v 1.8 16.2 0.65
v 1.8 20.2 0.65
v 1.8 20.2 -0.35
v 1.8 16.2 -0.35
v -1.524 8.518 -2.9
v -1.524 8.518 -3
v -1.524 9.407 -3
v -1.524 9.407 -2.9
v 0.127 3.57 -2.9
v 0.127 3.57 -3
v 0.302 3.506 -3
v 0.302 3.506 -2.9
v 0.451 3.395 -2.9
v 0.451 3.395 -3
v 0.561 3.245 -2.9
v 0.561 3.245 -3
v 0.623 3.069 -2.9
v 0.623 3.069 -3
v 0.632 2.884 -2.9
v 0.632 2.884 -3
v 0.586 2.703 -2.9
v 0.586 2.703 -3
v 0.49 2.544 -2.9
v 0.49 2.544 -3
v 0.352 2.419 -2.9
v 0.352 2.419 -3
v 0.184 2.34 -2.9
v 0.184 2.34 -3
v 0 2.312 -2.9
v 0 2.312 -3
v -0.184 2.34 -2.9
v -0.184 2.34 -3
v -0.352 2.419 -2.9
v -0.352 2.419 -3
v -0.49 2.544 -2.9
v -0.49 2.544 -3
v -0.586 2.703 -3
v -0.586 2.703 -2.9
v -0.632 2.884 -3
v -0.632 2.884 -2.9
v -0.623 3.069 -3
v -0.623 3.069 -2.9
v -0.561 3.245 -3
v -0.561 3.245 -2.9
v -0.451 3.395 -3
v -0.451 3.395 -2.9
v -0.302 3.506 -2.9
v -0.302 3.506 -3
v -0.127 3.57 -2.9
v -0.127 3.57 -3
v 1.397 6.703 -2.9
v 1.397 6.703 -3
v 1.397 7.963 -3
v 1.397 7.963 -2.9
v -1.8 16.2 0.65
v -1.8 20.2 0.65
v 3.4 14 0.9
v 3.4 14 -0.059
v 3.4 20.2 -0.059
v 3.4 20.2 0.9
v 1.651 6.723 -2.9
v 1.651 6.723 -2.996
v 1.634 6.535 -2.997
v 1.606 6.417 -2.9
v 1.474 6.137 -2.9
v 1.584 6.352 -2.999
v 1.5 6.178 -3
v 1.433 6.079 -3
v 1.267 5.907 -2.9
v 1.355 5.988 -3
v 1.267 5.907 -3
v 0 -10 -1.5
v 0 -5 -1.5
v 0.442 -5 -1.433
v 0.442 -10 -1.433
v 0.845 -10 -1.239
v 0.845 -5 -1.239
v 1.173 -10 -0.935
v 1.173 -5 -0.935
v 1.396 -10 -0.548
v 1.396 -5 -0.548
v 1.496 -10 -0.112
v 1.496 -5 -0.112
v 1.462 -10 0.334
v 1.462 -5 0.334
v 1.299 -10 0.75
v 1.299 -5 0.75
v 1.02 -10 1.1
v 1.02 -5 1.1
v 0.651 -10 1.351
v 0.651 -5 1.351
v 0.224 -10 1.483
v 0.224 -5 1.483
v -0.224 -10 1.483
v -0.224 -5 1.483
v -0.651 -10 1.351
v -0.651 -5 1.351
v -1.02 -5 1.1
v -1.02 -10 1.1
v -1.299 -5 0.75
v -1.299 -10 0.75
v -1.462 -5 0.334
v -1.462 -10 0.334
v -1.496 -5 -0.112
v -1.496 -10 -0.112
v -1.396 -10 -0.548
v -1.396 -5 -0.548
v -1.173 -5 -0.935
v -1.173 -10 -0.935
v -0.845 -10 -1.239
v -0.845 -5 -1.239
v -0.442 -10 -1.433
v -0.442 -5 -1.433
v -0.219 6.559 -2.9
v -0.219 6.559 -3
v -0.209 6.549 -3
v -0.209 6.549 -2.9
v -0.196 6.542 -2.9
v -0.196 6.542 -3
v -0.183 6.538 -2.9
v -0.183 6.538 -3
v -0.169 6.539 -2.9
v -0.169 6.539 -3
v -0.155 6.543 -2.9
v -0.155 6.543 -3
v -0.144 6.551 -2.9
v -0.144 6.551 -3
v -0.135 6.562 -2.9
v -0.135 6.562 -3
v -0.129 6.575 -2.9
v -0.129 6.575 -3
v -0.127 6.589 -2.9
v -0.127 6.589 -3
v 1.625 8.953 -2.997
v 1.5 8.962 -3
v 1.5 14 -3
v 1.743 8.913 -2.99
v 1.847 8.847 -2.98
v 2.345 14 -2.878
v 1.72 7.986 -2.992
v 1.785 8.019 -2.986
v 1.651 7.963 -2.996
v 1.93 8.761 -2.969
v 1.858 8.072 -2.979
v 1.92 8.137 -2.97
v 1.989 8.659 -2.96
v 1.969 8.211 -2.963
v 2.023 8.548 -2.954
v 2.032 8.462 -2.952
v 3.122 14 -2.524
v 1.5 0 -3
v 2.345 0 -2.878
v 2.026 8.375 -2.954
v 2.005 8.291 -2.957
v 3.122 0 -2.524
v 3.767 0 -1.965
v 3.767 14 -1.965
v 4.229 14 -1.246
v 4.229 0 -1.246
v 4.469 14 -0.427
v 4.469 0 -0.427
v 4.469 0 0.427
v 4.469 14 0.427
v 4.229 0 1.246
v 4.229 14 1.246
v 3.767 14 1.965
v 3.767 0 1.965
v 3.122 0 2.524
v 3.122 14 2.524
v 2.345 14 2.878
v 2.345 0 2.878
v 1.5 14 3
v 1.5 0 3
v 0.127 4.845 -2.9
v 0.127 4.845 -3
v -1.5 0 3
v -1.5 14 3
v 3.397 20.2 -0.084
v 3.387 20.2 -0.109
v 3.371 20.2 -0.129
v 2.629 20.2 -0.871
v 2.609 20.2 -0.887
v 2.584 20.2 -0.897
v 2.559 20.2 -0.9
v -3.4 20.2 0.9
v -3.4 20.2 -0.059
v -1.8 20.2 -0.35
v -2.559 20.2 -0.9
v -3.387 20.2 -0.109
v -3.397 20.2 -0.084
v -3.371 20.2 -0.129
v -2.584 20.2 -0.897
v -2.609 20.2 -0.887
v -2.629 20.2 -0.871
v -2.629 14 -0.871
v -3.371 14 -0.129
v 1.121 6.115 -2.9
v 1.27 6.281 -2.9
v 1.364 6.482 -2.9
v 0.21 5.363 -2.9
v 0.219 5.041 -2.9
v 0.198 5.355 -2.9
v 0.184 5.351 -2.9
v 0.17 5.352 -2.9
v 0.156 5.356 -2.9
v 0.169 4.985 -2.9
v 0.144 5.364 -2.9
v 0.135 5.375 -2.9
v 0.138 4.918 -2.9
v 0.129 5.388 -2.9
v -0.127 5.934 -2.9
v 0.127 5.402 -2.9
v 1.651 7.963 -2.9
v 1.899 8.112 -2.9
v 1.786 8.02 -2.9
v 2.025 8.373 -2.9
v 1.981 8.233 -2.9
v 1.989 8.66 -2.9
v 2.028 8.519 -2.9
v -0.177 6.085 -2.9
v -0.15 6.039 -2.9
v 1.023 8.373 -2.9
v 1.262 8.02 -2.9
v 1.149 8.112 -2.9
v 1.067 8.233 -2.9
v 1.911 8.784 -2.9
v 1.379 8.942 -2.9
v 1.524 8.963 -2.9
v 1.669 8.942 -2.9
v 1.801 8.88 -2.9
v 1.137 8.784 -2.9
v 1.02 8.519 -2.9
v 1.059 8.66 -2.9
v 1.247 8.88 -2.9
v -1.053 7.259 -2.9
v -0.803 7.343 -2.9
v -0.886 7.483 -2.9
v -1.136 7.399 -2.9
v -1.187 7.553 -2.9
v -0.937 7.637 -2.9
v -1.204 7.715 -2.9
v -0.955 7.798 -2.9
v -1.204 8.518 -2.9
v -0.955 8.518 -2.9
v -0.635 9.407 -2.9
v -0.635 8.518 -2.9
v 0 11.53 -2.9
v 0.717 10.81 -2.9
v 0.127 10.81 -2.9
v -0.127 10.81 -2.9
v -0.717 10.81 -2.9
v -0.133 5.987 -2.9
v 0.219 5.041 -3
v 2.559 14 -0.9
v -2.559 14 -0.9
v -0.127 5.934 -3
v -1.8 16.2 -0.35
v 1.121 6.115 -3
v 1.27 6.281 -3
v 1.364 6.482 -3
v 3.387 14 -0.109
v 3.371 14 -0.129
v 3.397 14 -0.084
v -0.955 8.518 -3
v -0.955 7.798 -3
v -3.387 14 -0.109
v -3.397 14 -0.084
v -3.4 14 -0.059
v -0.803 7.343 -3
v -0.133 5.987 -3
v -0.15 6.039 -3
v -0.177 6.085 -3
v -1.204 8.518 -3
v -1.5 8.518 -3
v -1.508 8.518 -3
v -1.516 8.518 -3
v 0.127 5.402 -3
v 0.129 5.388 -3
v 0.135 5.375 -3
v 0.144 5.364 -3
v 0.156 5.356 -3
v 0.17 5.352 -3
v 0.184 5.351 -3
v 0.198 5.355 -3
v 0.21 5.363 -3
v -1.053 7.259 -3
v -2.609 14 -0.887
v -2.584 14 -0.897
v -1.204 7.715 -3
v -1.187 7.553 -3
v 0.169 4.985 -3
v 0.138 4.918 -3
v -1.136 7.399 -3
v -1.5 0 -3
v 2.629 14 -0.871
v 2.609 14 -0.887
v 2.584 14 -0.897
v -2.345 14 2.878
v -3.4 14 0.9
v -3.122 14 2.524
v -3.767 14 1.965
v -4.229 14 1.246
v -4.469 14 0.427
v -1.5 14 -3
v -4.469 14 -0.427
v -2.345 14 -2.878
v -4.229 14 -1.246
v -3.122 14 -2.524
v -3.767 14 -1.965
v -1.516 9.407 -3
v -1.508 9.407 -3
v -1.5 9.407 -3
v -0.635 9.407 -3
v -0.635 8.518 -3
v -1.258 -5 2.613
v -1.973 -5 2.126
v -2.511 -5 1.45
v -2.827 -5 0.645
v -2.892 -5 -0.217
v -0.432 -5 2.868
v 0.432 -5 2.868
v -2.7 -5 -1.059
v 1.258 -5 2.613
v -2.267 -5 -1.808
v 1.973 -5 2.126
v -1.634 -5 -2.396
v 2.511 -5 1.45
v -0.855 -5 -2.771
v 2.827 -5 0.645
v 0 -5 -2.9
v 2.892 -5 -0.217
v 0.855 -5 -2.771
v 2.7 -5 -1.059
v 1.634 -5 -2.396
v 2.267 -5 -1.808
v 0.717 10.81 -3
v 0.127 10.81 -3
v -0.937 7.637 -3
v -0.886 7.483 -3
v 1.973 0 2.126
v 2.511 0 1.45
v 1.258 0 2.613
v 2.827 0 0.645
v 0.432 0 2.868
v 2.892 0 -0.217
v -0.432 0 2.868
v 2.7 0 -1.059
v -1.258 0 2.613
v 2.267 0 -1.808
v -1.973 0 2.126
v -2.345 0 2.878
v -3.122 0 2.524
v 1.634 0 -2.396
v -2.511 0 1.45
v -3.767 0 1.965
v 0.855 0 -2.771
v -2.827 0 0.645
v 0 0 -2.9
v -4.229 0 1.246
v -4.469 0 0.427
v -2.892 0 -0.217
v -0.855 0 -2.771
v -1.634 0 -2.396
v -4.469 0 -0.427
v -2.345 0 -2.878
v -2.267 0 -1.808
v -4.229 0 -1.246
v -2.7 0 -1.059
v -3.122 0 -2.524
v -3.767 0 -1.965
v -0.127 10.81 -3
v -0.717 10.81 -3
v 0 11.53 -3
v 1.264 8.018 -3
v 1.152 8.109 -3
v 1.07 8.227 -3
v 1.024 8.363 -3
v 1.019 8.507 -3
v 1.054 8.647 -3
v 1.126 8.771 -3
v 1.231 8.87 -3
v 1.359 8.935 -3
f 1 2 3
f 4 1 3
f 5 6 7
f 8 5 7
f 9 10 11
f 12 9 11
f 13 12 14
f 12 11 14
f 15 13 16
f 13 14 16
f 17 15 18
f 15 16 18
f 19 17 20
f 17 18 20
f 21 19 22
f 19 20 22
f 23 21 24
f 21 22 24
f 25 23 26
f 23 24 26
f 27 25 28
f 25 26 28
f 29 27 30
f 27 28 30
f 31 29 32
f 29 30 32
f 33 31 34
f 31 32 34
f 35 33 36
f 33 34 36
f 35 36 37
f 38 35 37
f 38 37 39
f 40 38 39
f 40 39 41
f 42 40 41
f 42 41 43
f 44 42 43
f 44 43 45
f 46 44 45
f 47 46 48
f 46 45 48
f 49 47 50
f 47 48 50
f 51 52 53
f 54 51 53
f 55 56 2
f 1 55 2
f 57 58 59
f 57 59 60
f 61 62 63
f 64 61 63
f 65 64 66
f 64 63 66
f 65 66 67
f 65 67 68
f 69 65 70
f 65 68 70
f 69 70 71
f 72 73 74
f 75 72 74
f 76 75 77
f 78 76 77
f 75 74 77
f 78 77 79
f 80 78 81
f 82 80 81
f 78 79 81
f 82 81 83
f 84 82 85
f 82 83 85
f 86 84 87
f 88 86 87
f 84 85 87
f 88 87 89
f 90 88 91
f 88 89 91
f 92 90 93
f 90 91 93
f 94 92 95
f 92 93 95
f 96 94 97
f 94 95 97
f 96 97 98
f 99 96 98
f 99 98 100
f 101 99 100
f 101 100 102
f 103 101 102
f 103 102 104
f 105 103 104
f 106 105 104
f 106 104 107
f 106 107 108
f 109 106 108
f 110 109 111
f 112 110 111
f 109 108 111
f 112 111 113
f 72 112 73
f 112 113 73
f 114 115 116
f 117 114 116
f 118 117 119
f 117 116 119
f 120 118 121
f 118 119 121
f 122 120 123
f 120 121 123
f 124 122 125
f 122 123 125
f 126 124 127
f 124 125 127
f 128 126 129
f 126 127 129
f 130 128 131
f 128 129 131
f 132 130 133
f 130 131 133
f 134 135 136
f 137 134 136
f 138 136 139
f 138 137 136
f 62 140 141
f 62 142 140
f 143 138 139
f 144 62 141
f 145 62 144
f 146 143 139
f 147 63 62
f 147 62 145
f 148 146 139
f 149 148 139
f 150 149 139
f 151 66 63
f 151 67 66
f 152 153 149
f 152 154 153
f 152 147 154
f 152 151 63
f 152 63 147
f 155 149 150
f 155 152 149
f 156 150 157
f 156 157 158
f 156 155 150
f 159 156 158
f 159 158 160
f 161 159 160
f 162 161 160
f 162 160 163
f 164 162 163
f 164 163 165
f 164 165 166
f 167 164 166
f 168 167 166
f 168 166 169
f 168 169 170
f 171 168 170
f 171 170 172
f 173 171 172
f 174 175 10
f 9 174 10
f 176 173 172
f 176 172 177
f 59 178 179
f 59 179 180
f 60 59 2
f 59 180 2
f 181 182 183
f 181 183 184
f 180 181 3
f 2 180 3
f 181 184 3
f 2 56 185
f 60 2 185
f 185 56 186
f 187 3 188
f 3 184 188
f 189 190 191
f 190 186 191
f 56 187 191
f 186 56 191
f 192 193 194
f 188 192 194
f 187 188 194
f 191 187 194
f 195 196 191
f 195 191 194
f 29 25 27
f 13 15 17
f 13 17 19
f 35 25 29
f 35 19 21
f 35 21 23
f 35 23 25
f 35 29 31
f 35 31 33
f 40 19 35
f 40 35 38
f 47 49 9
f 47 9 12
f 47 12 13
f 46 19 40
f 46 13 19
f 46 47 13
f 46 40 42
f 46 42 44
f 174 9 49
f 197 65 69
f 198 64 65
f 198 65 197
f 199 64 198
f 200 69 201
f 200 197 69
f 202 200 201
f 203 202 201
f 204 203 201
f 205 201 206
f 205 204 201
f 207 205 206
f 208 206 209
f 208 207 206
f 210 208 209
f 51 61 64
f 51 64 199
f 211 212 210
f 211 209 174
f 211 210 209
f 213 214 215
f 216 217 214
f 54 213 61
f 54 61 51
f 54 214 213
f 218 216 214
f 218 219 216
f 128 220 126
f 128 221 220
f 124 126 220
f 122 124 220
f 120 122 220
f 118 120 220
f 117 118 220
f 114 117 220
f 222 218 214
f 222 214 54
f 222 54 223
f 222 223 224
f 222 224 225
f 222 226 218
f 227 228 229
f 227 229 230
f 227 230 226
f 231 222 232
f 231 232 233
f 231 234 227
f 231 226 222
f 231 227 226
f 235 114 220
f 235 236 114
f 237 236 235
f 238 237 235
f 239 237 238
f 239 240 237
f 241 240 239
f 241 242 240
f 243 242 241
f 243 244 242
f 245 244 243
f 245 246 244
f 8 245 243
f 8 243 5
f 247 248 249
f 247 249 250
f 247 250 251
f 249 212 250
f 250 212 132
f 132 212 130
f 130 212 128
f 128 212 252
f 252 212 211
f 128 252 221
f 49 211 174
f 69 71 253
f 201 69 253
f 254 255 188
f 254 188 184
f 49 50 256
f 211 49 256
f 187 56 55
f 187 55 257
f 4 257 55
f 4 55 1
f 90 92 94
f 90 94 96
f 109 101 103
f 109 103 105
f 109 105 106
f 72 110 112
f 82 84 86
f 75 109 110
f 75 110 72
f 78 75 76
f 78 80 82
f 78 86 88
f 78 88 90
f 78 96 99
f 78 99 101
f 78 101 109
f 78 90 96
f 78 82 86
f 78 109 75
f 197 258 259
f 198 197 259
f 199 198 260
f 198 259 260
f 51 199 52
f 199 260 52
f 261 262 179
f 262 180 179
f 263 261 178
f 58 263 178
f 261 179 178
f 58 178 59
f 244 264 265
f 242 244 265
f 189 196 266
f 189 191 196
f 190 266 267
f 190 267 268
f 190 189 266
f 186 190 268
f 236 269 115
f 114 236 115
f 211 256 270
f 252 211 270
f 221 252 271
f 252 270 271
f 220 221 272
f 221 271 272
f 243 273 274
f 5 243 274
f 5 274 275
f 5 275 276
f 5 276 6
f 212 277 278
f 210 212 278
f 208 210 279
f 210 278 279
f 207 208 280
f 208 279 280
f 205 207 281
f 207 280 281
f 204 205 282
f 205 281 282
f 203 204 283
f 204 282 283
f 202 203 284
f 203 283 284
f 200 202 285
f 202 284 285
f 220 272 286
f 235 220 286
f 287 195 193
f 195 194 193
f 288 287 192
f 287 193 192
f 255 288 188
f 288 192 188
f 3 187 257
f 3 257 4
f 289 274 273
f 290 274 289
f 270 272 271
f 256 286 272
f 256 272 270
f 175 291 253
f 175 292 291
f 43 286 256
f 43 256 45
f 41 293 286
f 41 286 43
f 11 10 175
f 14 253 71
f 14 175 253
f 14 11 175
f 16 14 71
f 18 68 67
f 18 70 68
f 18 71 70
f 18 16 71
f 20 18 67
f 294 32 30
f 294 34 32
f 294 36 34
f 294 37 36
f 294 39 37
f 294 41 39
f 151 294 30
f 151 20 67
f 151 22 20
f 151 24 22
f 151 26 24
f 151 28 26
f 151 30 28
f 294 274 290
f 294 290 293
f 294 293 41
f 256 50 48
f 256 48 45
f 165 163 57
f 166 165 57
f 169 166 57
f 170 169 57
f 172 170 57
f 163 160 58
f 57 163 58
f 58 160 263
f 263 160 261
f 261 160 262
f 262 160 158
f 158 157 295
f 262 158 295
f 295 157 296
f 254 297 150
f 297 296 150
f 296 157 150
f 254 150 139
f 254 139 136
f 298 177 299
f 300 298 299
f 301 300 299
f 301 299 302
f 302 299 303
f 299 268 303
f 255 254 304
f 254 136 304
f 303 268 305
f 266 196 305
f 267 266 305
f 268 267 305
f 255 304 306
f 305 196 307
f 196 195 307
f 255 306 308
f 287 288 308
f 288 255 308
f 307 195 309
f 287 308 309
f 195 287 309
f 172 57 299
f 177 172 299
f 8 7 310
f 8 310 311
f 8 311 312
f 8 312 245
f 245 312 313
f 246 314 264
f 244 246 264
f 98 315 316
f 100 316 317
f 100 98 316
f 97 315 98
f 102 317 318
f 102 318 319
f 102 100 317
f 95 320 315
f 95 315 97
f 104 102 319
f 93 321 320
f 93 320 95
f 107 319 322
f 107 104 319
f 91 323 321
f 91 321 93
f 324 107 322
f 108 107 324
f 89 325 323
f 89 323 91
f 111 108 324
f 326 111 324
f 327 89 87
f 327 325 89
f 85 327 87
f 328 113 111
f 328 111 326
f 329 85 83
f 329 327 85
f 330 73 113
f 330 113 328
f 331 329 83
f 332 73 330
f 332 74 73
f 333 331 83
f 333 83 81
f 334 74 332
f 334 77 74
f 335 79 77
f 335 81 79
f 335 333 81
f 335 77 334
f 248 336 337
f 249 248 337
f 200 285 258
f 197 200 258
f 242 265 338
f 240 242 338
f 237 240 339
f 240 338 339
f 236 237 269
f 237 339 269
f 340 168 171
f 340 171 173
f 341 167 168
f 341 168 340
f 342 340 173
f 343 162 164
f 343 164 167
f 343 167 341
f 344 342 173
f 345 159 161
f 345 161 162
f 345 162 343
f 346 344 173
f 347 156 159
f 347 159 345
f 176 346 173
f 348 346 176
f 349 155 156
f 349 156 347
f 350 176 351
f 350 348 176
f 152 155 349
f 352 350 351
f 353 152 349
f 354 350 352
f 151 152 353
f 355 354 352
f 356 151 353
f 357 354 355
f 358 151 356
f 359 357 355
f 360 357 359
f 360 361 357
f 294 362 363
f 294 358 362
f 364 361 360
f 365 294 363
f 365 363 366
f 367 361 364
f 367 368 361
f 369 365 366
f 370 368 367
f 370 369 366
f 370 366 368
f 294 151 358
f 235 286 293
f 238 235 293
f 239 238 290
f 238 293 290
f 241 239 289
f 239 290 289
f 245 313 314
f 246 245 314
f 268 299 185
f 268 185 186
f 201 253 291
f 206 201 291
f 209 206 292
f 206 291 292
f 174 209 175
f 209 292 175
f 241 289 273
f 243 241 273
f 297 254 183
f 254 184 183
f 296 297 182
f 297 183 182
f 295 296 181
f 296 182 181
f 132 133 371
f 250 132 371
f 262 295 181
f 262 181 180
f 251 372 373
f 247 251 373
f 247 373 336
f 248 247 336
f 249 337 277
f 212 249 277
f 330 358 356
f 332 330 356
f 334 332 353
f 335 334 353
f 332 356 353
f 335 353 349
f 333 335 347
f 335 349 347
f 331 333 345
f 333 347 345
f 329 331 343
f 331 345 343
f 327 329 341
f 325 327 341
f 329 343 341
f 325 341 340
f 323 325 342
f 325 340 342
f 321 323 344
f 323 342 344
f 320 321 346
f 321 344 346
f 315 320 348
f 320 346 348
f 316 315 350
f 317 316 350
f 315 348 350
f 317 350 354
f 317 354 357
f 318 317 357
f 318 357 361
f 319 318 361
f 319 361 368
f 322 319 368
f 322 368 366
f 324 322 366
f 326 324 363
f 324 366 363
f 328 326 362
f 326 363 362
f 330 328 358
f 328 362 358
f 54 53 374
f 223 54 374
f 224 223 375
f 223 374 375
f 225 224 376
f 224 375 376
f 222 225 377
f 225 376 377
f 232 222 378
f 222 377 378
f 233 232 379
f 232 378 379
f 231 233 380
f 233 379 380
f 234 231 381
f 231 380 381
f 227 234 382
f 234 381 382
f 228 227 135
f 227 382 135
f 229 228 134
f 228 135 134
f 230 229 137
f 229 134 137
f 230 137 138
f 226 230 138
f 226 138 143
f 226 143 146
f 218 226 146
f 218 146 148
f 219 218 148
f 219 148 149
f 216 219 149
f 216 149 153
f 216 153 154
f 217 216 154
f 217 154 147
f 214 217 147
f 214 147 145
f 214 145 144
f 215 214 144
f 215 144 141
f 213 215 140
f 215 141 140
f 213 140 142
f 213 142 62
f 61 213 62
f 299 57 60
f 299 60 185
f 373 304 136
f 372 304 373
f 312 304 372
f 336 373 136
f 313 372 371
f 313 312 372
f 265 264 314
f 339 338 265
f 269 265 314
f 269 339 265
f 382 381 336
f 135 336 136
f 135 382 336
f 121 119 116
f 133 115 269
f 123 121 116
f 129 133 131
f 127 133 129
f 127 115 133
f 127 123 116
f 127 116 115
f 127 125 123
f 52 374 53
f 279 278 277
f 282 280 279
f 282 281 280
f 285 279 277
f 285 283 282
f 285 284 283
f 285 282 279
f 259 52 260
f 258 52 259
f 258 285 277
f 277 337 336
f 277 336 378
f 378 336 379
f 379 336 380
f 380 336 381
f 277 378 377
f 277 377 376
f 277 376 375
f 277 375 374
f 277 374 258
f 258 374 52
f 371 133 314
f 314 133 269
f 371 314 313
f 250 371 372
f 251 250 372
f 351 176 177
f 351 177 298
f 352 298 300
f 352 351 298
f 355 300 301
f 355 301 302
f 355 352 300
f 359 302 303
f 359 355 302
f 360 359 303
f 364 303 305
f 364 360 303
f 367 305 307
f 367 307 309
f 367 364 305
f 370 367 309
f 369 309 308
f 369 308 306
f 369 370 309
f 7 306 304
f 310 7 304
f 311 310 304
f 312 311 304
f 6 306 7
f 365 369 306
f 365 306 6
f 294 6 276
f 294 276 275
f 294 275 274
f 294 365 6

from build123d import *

# Parameters (mm, degrees)
EXTRUDE_1_DEPTH     = 14
SKETCH_2_R          = 2.9
EXTRUDE_2_DEPTH     = 5
EXTRUDE_3_DEPTH     = 6.2
SKETCH_5_W          = 3.6
SKETCH_5_H          = 1
CUT_EXTRUDE_1_DEPTH = 4
FILLET_1_R          = 0.1
SKETCH_6_R          = 1.5
EXTRUDE_4_DEPTH     = 5
CUT_EXTRUDE_2_DEPTH = 0.1


with BuildPart() as part:
    # 草图1 → 凸台-拉伸1 (new body)
    with BuildSketch(Plane(origin=(0, 0, 0), x_dir=(1, 0, 0), z_dir=(0, 1, 0))):
        with BuildLine():
            Line((-1.5, 3), (1.5, 3))
            ThreePointArc((1.5, 3), (4.5, 0), (1.5, -3))
            Line((1.5, -3), (-1.5, -3))
            ThreePointArc((-1.5, -3), (-4.5, 0), (-1.5, 3))
        make_face()
    extrude(amount=EXTRUDE_1_DEPTH)

    # 草图2 → 凸台-拉伸2 (add)
    with BuildSketch(Plane.XZ):
        with Locations(Location((0, 0, 0), (0, 0, 270))):
            Circle(SKETCH_2_R)
    extrude(amount=EXTRUDE_2_DEPTH)

    # 草图3 → 凸台-拉伸3 (add)
    with BuildSketch(Plane(origin=(0, 14, 0), x_dir=(1, 0, 0), z_dir=(0, 1, 0))):
        Polygon((-3.4, 0.1), (-2.6, 0.9), (2.6, 0.9), (3.4, 0.1), (3.4, -0.9), (-3.4, -0.9), align=None)
    extrude(amount=EXTRUDE_3_DEPTH)

    # 草图5 → 切除-拉伸1 (cut)
    with BuildSketch(Plane(origin=(0, 20.2, 0), x_dir=(1, 0, 0), z_dir=(0, 1, 0))):
        with Locations((0, -0.15)):
            Rectangle(SKETCH_5_W, SKETCH_5_H)
    extrude(amount=-CUT_EXTRUDE_1_DEPTH, mode=Mode.SUBTRACT)

    # 圆角1
    fillet_1_edges = [part.edges().sort_by_distance(p)[0] for p in [
        (3.4, 17.1, -0.1),
        (2.6, 17.1, -0.9),
        (-2.6, 17.1, -0.9),
        (-3.4, 17.1, -0.1),
    ]]
    fillet(fillet_1_edges, radius=FILLET_1_R)

    # 草图6 → 凸台-拉伸4 (add)
    with BuildSketch(Plane.XZ.offset(5)):
        with Locations(Location((0, 0, 0), (0, 0, 270))):
            Circle(SKETCH_6_R)
    extrude(amount=EXTRUDE_4_DEPTH)

    # 草图8 → 切除-拉伸2 (cut)
    with BuildSketch(Plane(origin=(0, 0, -3), x_dir=(-1, 0, 0), z_dir=(0, 0, -1))):
        with BuildLine():
            Line((0, 11.52960021), (-0.716956191, 10.8097184))
            Line((-0.716956191, 10.8097184), (-0.127, 10.8097184))
            Line((-0.127, 10.8097184), (-0.127, 5.401898496))
            ThreePointArc((-0.127, 5.401898496), (-0.156162493, 5.355937009), (-0.21016765, 5.362745269))
            Line((-0.21016765, 5.362745269), (-1.120514747, 6.115321688))
            ThreePointArc((-1.120514747, 6.115321688), (-1.324422308, 6.378057505), (-1.397, 6.702620106))
            Line((-1.397, 6.702620106), (-1.397, 7.963089706))
            ThreePointArc((-1.397, 7.963089706), (-1.524, 8.962958591), (-1.651, 7.963089706))
            Line((-1.651, 7.963089706), (-1.651, 6.722530894))
            ThreePointArc((-1.651, 6.722530894), (-1.550201428, 6.271766401), (-1.267007097, 5.906869222))
            Line((-1.267007097, 5.906869222), (-0.219161751, 5.040624136))
            ThreePointArc((-0.219161751, 5.040624136), (-0.151192564, 4.953045531), (-0.127, 4.844857997))
            Line((-0.127, 4.844857997), (-0.127, 3.56953501))
            ThreePointArc((-0.127, 3.56953501), (0, 2.312364615), (0.127, 3.56953501))
            Line((0.127, 3.56953501), (0.127, 5.933535284))
            ThreePointArc((0.127, 5.933535284), (0.139930568, 6.013544838), (0.177405738, 6.08540818))
            Line((0.177405738, 6.08540818), (1.053118903, 7.259351528))
            ThreePointArc((1.053118903, 7.259351528), (1.165544414, 7.474941553), (1.204336117, 7.714970215))
            Line((1.204336117, 7.714970215), (1.204336117, 8.518458591))
            Line((1.204336117, 8.518458591), (1.524, 8.518458591))
            Line((1.524, 8.518458591), (1.524, 9.407458591))
            Line((1.524, 9.407458591), (0.635, 9.407458591))
            Line((0.635, 9.407458591), (0.635, 8.518458591))
            Line((0.635, 8.518458591), (0.954663883, 8.518458591))
            Line((0.954663883, 8.518458591), (0.954663883, 7.798383163))
            ThreePointArc((0.954663883, 7.798383163), (0.915872181, 7.558354501), (0.80344667, 7.342764476))
            Line((0.80344667, 7.342764476), (0.218518852, 6.558635439))
            ThreePointArc((0.218518852, 6.558635439), (0.161798089, 6.540796132), (0.127, 6.589010019))
            Line((0.127, 6.589010019), (0.127, 10.8097184))
            Line((0.127, 10.8097184), (0.716956191, 10.8097184))
            Line((0.716956191, 10.8097184), (0, 11.52960021))
        make_face()
    extrude(amount=-CUT_EXTRUDE_2_DEPTH, mode=Mode.SUBTRACT)


solid = part.part
